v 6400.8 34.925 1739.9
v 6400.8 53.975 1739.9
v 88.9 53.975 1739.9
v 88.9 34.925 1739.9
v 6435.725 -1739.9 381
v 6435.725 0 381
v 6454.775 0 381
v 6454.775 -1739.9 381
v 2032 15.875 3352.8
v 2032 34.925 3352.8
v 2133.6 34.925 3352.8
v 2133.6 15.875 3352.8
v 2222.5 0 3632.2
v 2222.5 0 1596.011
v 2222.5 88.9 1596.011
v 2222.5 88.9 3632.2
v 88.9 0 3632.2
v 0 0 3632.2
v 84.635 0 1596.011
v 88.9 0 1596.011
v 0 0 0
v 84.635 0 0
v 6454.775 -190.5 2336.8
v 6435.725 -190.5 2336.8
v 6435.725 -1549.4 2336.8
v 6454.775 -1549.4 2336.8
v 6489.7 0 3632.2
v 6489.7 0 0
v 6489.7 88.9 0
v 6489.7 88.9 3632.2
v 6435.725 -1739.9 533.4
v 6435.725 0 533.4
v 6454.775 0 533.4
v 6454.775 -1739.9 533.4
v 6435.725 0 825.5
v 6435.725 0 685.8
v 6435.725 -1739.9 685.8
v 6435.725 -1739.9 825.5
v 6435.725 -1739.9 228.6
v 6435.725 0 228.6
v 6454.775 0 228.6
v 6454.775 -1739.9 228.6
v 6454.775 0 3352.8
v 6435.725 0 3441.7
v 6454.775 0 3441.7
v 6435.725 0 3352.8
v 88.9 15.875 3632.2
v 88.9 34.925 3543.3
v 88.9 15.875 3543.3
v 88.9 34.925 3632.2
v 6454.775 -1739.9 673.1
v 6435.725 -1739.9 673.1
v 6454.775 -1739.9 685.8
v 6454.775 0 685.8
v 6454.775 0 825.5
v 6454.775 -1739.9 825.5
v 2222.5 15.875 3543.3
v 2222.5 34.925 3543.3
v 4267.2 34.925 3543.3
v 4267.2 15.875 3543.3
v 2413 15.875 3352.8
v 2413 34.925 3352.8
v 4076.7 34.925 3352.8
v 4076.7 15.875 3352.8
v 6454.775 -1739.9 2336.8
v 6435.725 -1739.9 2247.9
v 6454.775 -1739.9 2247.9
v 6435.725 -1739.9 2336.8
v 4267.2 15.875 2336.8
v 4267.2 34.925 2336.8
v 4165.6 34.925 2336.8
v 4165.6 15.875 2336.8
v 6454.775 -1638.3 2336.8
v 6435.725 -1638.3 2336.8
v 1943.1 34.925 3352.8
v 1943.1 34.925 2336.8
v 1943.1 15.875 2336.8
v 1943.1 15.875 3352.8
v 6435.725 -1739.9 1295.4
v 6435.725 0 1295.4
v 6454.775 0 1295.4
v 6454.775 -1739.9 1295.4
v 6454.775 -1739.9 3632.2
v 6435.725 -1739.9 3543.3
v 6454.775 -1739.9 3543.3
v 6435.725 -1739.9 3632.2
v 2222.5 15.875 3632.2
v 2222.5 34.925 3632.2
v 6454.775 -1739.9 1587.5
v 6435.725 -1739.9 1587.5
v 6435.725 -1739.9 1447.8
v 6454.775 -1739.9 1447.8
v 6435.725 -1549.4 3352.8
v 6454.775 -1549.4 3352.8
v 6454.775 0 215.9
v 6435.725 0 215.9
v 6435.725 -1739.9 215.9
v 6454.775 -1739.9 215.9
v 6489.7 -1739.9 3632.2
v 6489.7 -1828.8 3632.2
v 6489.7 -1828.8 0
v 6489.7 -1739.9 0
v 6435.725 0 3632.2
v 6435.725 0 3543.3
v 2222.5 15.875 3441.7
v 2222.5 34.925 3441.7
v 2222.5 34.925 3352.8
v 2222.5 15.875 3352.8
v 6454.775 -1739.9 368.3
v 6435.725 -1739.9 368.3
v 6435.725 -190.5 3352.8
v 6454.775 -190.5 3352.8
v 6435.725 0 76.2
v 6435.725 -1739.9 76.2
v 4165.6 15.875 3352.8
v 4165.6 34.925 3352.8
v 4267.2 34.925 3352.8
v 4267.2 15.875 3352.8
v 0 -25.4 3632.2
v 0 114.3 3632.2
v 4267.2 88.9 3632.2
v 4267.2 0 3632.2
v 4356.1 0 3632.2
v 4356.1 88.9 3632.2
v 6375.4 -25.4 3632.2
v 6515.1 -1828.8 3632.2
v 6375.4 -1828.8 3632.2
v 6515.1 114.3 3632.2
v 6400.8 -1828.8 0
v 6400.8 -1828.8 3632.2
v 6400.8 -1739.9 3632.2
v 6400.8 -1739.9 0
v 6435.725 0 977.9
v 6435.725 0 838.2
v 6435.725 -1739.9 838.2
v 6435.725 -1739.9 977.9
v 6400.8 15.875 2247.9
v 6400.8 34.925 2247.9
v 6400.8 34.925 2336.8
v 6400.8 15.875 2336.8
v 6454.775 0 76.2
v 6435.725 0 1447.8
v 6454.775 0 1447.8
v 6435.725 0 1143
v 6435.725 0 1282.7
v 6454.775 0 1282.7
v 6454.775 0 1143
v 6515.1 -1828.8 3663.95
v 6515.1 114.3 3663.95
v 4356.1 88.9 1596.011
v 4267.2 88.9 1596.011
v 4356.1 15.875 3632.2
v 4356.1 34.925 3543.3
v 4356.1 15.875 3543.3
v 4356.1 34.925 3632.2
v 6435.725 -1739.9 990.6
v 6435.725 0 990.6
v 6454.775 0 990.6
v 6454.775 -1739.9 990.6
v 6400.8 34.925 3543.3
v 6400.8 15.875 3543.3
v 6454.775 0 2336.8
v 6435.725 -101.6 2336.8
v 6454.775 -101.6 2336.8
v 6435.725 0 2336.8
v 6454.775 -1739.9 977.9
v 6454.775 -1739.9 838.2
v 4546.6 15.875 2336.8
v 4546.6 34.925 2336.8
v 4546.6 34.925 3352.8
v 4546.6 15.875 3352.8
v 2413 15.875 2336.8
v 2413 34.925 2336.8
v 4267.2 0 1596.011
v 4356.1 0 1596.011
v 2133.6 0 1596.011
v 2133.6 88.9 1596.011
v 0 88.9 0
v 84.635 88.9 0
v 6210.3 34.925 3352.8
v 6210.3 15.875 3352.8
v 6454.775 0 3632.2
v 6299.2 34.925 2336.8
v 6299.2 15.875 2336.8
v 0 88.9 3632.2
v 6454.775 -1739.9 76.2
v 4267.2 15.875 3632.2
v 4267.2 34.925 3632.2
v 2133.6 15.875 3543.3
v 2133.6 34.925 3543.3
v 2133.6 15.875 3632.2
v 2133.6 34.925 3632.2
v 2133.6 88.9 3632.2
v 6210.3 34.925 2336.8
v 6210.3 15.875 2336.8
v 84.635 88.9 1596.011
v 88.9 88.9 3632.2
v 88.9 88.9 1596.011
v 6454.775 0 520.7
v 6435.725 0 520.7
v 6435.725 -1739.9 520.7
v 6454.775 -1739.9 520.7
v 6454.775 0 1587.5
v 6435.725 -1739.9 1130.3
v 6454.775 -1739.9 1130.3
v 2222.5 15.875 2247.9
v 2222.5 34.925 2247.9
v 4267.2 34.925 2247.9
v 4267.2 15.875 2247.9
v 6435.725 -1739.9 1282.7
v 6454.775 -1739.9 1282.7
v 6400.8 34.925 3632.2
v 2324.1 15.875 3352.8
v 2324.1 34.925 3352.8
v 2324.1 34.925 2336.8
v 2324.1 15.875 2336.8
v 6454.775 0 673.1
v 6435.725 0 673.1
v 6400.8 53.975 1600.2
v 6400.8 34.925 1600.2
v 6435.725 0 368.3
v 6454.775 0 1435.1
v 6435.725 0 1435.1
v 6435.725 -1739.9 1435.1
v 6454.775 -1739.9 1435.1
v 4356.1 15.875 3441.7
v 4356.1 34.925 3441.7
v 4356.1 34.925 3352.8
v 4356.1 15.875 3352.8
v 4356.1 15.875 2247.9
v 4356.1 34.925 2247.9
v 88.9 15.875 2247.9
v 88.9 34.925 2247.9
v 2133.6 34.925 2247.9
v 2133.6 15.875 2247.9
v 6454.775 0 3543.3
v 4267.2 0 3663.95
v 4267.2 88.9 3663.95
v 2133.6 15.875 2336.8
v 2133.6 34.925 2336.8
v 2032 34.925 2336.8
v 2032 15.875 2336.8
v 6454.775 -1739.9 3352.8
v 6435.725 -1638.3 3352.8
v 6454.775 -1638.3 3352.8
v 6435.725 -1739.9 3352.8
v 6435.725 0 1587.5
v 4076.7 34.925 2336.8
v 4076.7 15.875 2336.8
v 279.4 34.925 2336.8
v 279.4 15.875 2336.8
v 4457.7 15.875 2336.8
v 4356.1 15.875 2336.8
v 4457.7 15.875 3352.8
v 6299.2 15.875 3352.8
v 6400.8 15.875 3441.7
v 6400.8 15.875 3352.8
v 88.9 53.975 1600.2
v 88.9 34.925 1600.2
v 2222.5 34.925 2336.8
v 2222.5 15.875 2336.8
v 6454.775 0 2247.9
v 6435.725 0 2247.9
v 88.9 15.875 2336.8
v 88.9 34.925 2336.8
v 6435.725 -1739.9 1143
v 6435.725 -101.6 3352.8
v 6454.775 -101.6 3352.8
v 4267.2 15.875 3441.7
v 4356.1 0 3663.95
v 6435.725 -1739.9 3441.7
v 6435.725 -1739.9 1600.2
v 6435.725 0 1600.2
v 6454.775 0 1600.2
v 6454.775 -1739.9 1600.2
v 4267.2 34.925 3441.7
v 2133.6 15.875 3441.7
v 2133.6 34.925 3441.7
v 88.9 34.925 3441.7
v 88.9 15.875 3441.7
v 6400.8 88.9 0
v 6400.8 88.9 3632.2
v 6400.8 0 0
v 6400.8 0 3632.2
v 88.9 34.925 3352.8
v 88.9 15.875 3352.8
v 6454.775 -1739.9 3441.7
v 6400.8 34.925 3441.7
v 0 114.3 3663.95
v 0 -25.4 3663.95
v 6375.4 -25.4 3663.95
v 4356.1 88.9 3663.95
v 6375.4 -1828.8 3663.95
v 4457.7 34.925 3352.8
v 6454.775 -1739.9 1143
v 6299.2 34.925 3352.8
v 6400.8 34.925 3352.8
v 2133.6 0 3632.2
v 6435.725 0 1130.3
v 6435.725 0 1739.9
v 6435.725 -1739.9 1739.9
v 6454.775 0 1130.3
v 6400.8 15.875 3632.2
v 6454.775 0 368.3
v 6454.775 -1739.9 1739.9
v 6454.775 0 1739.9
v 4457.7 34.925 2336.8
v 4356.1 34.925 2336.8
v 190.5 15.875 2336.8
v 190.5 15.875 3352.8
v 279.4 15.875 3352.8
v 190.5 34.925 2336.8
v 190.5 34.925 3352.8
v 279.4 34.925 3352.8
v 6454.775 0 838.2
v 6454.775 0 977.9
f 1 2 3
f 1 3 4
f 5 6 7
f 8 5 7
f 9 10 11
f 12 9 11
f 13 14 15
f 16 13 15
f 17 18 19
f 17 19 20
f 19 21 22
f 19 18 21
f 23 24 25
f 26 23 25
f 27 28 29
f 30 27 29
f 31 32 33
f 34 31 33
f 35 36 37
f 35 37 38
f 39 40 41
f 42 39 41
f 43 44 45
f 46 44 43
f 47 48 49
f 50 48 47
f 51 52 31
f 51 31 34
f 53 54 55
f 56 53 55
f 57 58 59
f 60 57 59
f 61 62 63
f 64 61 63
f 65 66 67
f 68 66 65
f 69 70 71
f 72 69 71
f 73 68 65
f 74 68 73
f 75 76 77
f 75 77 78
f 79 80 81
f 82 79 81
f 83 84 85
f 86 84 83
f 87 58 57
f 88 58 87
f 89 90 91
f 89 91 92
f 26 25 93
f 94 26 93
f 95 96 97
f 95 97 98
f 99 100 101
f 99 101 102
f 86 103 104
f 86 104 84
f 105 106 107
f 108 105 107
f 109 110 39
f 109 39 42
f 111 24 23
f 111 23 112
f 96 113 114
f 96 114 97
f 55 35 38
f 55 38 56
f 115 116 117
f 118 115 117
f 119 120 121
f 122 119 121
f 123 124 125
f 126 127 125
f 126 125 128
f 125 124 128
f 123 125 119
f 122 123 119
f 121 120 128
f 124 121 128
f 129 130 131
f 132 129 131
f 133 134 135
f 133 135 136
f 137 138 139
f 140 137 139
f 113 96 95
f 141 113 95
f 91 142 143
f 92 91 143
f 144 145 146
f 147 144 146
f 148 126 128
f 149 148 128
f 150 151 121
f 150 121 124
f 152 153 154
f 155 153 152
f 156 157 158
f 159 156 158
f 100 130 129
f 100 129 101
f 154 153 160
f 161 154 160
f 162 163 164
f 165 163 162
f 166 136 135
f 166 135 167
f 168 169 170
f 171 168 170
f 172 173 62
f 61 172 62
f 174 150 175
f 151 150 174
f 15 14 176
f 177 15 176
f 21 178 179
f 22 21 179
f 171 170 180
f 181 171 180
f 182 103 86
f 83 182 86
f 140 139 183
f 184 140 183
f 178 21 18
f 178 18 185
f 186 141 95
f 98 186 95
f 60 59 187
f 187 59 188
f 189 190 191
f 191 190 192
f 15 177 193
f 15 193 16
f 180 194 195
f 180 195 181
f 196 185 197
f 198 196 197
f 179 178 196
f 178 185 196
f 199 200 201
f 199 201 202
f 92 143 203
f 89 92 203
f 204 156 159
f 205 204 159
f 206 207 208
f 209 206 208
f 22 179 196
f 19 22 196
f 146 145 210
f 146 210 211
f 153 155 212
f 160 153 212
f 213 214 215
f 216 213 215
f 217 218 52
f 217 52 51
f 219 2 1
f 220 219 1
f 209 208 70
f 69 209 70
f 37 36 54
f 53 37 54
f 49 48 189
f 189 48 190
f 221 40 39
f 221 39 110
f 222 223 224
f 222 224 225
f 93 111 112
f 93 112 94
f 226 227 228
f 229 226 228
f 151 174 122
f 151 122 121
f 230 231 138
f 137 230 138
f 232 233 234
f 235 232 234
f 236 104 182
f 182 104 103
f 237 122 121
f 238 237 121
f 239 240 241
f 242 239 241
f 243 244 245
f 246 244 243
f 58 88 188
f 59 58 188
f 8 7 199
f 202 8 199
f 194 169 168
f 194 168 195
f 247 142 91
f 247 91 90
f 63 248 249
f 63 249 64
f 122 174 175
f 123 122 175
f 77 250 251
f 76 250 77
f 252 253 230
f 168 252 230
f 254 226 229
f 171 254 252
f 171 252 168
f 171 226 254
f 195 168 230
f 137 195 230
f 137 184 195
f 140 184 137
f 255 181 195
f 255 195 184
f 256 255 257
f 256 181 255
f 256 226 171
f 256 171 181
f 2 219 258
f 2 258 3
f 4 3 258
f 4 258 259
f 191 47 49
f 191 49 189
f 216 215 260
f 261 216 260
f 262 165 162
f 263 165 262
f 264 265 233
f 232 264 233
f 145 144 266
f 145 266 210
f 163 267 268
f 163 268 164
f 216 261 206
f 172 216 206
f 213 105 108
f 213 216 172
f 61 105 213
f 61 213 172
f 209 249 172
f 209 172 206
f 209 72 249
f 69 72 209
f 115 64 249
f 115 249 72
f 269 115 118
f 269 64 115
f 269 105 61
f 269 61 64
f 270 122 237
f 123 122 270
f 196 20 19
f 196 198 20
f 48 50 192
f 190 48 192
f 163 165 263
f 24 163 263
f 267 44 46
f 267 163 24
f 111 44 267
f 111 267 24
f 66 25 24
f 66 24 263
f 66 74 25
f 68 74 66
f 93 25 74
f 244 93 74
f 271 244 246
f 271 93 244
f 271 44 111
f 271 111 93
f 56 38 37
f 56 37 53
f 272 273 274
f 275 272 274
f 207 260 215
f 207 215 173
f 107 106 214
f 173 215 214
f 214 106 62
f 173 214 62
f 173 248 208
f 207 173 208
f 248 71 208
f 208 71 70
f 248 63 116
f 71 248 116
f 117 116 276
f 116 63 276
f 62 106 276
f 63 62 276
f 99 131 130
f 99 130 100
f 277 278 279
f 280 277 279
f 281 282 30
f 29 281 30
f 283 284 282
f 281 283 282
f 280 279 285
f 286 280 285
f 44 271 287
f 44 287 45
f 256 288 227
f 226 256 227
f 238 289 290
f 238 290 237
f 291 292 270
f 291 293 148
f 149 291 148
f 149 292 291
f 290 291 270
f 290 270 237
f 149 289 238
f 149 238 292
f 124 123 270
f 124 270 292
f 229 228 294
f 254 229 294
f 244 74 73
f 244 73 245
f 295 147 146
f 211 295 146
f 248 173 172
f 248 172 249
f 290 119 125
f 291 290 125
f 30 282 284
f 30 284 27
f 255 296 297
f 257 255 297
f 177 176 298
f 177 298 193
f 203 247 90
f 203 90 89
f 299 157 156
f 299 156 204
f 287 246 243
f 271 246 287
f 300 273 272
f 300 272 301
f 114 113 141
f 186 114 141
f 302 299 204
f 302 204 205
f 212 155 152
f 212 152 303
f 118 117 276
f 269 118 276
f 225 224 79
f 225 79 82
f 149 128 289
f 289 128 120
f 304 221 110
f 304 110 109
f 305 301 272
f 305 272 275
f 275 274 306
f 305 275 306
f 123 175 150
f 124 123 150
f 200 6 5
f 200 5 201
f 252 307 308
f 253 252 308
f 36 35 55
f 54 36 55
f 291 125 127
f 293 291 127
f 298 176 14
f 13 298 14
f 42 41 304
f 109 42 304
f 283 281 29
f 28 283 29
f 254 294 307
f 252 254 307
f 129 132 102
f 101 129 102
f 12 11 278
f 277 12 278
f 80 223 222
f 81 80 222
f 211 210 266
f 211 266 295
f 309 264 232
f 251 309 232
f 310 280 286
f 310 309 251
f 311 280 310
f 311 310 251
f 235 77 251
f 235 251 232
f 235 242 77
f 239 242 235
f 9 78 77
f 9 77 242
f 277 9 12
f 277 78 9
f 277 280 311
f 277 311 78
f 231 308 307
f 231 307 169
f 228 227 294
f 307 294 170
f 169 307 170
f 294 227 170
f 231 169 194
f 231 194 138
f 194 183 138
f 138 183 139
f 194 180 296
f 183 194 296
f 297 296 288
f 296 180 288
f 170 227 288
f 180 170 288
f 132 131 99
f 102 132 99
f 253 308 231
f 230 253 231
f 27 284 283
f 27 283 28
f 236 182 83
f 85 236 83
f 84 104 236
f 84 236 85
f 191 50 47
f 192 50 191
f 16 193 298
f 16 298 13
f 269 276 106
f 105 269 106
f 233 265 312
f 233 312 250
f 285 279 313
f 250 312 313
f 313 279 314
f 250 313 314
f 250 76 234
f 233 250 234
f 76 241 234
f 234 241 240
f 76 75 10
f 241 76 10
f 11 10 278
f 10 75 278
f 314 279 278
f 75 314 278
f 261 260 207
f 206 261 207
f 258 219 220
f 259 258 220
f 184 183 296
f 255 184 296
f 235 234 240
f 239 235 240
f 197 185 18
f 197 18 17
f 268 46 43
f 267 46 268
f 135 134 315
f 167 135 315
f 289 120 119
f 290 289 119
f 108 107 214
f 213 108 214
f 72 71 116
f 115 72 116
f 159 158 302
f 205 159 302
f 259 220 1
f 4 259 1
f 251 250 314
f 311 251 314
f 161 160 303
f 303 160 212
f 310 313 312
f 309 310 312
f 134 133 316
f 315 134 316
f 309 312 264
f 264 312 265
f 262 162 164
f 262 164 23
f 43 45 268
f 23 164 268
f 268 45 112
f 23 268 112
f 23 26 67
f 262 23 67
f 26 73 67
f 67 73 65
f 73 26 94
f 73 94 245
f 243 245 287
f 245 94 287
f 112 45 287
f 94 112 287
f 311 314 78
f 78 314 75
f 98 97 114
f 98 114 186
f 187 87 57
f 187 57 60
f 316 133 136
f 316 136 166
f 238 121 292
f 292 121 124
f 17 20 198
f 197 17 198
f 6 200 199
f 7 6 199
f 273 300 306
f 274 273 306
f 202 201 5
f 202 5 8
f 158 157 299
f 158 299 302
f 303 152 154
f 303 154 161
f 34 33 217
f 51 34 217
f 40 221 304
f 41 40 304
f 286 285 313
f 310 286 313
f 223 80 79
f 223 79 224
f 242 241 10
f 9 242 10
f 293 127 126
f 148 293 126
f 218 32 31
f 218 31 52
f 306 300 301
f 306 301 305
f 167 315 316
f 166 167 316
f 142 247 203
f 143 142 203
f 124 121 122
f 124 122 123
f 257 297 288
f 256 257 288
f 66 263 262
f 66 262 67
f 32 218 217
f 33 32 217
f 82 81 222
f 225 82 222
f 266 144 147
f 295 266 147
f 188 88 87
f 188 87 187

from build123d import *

# Parameters (mm, degrees)
F0_W      = 88.9
F0_H      = 88.9
F1_DEPTH  = 3632.2
F2_W      = 19.05
F2_H      = 139.7
F3_DEPTH  = 1739.9
F4_W      = 19.05
F4_H      = 139.7
F5_DEPTH  = 6311.9
F6_W      = 88.9
F6_H      = 88.9
F7_DEPTH  = 31.75
F8_W      = 1739.9
F8_H      = 88.9
F8_W_2    = 1358.9
F8_H_2    = 1016
F9_DEPTH  = 19.05
F10_W     = 2044.7
F10_H     = 88.9
F10_W_2   = 1663.7
F10_H_2   = 1016
F11_DEPTH = 19.05
F12_W     = 6316.164638
F12_H     = 1596.011162
F13_DEPTH = 152.4


with BuildPart() as f1:
    # F0 (on Top) → F1 (new body)
    with BuildSketch(Plane.XY):
        with Locations((6445.25, 44.45)):
            Rectangle(F0_W, F0_H)
        with Locations((6445.25, -1784.35)):
            Rectangle(F0_W, F0_H)
        with Locations((44.45, 44.45)):
            Rectangle(F0_W, F0_H)
        with Locations((2178.05, 44.45)):
            Rectangle(F0_W, F0_H)
        with Locations((4311.65, 44.45)):
            Rectangle(F0_W, F0_H)
    extrude(amount=F1_DEPTH)


with BuildPart() as f3:
    # F2 (on face) → F3 (new body)
    with BuildSketch(Plane.XZ):
        with Locations((6445.25, 1670.05)):
            Rectangle(F2_W, F2_H)
        with Locations((6445.25, 1517.65)):
            Rectangle(F2_W, F2_H)
        with Locations((6445.25, 1365.25)):
            Rectangle(F2_W, F2_H)
        with Locations((6445.25, 1212.85)):
            Rectangle(F2_W, F2_H)
        with Locations((6445.25, 1060.45)):
            Rectangle(F2_W, F2_H)
        with Locations((6445.25, 908.05)):
            Rectangle(F2_W, F2_H)
        with Locations((6445.25, 755.65)):
            Rectangle(F2_W, F2_H)
        with Locations((6445.25, 603.25)):
            Rectangle(F2_W, F2_H)
        with Locations((6445.25, 450.85)):
            Rectangle(F2_W, F2_H)
        with Locations((6445.25, 298.45)):
            Rectangle(F2_W, F2_H)
        with Locations((6445.25, 146.05)):
            Rectangle(F2_W, F2_H)
    extrude(amount=F3_DEPTH)


with BuildPart() as f5:
    # F4 (on face) → F5 (new body)
    with BuildSketch(Plane(origin=(6400.8, 0, 0), x_dir=(0, -1, 0), z_dir=(-1, 0, 0))):
        with Locations((-44.45, 1670.05)):
            Rectangle(F4_W, F4_H)
        with Locations((-44.45, 1517.65)):
            Rectangle(F4_W, F4_H)
        with Locations((-44.45, 1365.25)):
            Rectangle(F4_W, F4_H)
        with Locations((-44.45, 1212.85)):
            Rectangle(F4_W, F4_H)
        with Locations((-44.45, 1060.45)):
            Rectangle(F4_W, F4_H)
        with Locations((-44.45, 908.05)):
            Rectangle(F4_W, F4_H)
        with Locations((-44.45, 755.65)):
            Rectangle(F4_W, F4_H)
        with Locations((-44.45, 603.25)):
            Rectangle(F4_W, F4_H)
        with Locations((-44.45, 450.85)):
            Rectangle(F4_W, F4_H)
        with Locations((-44.45, 298.45)):
            Rectangle(F4_W, F4_H)
        with Locations((-44.45, 146.05)):
            Rectangle(F4_W, F4_H)
    extrude(amount=F5_DEPTH)


with BuildPart() as f7:
    # F6 (on face) → F7 (new body)
    with BuildSketch(Plane.XY.offset(3632.2)):
        Polygon((0, 114.3), (0, -25.4), (6375.4, -25.4), (6375.4, -1828.8), (6515.1, -1828.8), (6515.1, 114.3), align=None)
        with Locations((4311.65, 44.45)):
            Rectangle(F6_W, F6_H, mode=Mode.SUBTRACT)
    extrude(amount=F7_DEPTH)


with BuildPart() as f9:
    # F8 (on face) → F9 (new body)
    with BuildSketch(Plane(origin=(6435.725, 0, 0), x_dir=(0, -1, 0), z_dir=(-1, 0, 0))):
        with Locations((869.95, 3587.75)):
            Rectangle(F8_W, F8_H)
        Polygon((1739.9, 3441.7), (0, 3441.7), (0, 3352.8), (101.6, 3352.8), (101.6, 2336.8), (0, 2336.8), (0, 2247.9), (1739.9, 2247.9), (1739.9, 2336.8), (1638.3, 2336.8), (1638.3, 3352.8), (1739.9, 3352.8), align=None)
        with Locations((869.95, 2844.8)):
            Rectangle(F8_W_2, F8_H_2, mode=Mode.SUBTRACT)
    extrude(amount=-F9_DEPTH)


with BuildPart() as f11:
    # F10 (on face) → F11 (new body)
    with BuildSketch(Plane.XZ.offset(-34.925)):
        with Locations((5378.45, 3587.75)):
            Rectangle(F10_W, F10_H)
        with Locations((3244.85, 3587.75)):
            Rectangle(F10_W, F10_H)
        with Locations((1111.25, 3587.75)):
            Rectangle(F10_W, F10_H)
        Polygon((6400.8, 3352.8), (6400.8, 3441.7), (4356.1, 3441.7), (4356.1, 3352.8), (4457.7, 3352.8), (4457.7, 2336.8), (4356.1, 2336.8), (4356.1, 2247.9), (6400.8, 2247.9), (6400.8, 2336.8), (6299.2, 2336.8), (6299.2, 3352.8), align=None)
        with Locations((5378.45, 2844.8)):
            Rectangle(F10_W_2, F10_H_2, mode=Mode.SUBTRACT)
        Polygon((4267.2, 3352.8), (4267.2, 3441.7), (2222.5, 3441.7), (2222.5, 3352.8), (2324.1, 3352.8), (2324.1, 2336.8), (2222.5, 2336.8), (2222.5, 2247.9), (4267.2, 2247.9), (4267.2, 2336.8), (4165.6, 2336.8), (4165.6, 3352.8), align=None)
        with Locations((3244.85, 2844.8)):
            Rectangle(F10_W_2, F10_H_2, mode=Mode.SUBTRACT)
        Polygon((2133.6, 3352.8), (2133.6, 3441.7), (88.9, 3441.7), (88.9, 3352.8), (190.5, 3352.8), (190.5, 2336.8), (88.9, 2336.8), (88.9, 2247.9), (2133.6, 2247.9), (2133.6, 2336.8), (2032, 2336.8), (2032, 3352.8), align=None)
        with Locations((1111.25, 2844.8)):
            Rectangle(F10_W_2, F10_H_2, mode=Mode.SUBTRACT)
    extrude(amount=F11_DEPTH)


with BuildPart() as f13_tool:
    # F12 (on face) → F13 (new body)
    with BuildSketch(Plane(origin=(0, 88.9, 0), x_dir=(-1, 0, 0), z_dir=(0, 1, 0))):
        with Locations((-3242.717681, 798.005581)):
            Rectangle(F12_W, F12_H)
    extrude(amount=-F13_DEPTH)


with BuildPart() as f1_1:
    add(f1.part)

    # F13: cut by f13_tool
    add(f13_tool.part, mode=Mode.SUBTRACT)


with BuildPart() as f5_1:
    add(f5.part)

    # F13: cut by f13_tool
    add(f13_tool.part, mode=Mode.SUBTRACT)


solid = Compound([f3.part, f7.part, f9.part, f11.part, f1_1.part, f5_1.part])
